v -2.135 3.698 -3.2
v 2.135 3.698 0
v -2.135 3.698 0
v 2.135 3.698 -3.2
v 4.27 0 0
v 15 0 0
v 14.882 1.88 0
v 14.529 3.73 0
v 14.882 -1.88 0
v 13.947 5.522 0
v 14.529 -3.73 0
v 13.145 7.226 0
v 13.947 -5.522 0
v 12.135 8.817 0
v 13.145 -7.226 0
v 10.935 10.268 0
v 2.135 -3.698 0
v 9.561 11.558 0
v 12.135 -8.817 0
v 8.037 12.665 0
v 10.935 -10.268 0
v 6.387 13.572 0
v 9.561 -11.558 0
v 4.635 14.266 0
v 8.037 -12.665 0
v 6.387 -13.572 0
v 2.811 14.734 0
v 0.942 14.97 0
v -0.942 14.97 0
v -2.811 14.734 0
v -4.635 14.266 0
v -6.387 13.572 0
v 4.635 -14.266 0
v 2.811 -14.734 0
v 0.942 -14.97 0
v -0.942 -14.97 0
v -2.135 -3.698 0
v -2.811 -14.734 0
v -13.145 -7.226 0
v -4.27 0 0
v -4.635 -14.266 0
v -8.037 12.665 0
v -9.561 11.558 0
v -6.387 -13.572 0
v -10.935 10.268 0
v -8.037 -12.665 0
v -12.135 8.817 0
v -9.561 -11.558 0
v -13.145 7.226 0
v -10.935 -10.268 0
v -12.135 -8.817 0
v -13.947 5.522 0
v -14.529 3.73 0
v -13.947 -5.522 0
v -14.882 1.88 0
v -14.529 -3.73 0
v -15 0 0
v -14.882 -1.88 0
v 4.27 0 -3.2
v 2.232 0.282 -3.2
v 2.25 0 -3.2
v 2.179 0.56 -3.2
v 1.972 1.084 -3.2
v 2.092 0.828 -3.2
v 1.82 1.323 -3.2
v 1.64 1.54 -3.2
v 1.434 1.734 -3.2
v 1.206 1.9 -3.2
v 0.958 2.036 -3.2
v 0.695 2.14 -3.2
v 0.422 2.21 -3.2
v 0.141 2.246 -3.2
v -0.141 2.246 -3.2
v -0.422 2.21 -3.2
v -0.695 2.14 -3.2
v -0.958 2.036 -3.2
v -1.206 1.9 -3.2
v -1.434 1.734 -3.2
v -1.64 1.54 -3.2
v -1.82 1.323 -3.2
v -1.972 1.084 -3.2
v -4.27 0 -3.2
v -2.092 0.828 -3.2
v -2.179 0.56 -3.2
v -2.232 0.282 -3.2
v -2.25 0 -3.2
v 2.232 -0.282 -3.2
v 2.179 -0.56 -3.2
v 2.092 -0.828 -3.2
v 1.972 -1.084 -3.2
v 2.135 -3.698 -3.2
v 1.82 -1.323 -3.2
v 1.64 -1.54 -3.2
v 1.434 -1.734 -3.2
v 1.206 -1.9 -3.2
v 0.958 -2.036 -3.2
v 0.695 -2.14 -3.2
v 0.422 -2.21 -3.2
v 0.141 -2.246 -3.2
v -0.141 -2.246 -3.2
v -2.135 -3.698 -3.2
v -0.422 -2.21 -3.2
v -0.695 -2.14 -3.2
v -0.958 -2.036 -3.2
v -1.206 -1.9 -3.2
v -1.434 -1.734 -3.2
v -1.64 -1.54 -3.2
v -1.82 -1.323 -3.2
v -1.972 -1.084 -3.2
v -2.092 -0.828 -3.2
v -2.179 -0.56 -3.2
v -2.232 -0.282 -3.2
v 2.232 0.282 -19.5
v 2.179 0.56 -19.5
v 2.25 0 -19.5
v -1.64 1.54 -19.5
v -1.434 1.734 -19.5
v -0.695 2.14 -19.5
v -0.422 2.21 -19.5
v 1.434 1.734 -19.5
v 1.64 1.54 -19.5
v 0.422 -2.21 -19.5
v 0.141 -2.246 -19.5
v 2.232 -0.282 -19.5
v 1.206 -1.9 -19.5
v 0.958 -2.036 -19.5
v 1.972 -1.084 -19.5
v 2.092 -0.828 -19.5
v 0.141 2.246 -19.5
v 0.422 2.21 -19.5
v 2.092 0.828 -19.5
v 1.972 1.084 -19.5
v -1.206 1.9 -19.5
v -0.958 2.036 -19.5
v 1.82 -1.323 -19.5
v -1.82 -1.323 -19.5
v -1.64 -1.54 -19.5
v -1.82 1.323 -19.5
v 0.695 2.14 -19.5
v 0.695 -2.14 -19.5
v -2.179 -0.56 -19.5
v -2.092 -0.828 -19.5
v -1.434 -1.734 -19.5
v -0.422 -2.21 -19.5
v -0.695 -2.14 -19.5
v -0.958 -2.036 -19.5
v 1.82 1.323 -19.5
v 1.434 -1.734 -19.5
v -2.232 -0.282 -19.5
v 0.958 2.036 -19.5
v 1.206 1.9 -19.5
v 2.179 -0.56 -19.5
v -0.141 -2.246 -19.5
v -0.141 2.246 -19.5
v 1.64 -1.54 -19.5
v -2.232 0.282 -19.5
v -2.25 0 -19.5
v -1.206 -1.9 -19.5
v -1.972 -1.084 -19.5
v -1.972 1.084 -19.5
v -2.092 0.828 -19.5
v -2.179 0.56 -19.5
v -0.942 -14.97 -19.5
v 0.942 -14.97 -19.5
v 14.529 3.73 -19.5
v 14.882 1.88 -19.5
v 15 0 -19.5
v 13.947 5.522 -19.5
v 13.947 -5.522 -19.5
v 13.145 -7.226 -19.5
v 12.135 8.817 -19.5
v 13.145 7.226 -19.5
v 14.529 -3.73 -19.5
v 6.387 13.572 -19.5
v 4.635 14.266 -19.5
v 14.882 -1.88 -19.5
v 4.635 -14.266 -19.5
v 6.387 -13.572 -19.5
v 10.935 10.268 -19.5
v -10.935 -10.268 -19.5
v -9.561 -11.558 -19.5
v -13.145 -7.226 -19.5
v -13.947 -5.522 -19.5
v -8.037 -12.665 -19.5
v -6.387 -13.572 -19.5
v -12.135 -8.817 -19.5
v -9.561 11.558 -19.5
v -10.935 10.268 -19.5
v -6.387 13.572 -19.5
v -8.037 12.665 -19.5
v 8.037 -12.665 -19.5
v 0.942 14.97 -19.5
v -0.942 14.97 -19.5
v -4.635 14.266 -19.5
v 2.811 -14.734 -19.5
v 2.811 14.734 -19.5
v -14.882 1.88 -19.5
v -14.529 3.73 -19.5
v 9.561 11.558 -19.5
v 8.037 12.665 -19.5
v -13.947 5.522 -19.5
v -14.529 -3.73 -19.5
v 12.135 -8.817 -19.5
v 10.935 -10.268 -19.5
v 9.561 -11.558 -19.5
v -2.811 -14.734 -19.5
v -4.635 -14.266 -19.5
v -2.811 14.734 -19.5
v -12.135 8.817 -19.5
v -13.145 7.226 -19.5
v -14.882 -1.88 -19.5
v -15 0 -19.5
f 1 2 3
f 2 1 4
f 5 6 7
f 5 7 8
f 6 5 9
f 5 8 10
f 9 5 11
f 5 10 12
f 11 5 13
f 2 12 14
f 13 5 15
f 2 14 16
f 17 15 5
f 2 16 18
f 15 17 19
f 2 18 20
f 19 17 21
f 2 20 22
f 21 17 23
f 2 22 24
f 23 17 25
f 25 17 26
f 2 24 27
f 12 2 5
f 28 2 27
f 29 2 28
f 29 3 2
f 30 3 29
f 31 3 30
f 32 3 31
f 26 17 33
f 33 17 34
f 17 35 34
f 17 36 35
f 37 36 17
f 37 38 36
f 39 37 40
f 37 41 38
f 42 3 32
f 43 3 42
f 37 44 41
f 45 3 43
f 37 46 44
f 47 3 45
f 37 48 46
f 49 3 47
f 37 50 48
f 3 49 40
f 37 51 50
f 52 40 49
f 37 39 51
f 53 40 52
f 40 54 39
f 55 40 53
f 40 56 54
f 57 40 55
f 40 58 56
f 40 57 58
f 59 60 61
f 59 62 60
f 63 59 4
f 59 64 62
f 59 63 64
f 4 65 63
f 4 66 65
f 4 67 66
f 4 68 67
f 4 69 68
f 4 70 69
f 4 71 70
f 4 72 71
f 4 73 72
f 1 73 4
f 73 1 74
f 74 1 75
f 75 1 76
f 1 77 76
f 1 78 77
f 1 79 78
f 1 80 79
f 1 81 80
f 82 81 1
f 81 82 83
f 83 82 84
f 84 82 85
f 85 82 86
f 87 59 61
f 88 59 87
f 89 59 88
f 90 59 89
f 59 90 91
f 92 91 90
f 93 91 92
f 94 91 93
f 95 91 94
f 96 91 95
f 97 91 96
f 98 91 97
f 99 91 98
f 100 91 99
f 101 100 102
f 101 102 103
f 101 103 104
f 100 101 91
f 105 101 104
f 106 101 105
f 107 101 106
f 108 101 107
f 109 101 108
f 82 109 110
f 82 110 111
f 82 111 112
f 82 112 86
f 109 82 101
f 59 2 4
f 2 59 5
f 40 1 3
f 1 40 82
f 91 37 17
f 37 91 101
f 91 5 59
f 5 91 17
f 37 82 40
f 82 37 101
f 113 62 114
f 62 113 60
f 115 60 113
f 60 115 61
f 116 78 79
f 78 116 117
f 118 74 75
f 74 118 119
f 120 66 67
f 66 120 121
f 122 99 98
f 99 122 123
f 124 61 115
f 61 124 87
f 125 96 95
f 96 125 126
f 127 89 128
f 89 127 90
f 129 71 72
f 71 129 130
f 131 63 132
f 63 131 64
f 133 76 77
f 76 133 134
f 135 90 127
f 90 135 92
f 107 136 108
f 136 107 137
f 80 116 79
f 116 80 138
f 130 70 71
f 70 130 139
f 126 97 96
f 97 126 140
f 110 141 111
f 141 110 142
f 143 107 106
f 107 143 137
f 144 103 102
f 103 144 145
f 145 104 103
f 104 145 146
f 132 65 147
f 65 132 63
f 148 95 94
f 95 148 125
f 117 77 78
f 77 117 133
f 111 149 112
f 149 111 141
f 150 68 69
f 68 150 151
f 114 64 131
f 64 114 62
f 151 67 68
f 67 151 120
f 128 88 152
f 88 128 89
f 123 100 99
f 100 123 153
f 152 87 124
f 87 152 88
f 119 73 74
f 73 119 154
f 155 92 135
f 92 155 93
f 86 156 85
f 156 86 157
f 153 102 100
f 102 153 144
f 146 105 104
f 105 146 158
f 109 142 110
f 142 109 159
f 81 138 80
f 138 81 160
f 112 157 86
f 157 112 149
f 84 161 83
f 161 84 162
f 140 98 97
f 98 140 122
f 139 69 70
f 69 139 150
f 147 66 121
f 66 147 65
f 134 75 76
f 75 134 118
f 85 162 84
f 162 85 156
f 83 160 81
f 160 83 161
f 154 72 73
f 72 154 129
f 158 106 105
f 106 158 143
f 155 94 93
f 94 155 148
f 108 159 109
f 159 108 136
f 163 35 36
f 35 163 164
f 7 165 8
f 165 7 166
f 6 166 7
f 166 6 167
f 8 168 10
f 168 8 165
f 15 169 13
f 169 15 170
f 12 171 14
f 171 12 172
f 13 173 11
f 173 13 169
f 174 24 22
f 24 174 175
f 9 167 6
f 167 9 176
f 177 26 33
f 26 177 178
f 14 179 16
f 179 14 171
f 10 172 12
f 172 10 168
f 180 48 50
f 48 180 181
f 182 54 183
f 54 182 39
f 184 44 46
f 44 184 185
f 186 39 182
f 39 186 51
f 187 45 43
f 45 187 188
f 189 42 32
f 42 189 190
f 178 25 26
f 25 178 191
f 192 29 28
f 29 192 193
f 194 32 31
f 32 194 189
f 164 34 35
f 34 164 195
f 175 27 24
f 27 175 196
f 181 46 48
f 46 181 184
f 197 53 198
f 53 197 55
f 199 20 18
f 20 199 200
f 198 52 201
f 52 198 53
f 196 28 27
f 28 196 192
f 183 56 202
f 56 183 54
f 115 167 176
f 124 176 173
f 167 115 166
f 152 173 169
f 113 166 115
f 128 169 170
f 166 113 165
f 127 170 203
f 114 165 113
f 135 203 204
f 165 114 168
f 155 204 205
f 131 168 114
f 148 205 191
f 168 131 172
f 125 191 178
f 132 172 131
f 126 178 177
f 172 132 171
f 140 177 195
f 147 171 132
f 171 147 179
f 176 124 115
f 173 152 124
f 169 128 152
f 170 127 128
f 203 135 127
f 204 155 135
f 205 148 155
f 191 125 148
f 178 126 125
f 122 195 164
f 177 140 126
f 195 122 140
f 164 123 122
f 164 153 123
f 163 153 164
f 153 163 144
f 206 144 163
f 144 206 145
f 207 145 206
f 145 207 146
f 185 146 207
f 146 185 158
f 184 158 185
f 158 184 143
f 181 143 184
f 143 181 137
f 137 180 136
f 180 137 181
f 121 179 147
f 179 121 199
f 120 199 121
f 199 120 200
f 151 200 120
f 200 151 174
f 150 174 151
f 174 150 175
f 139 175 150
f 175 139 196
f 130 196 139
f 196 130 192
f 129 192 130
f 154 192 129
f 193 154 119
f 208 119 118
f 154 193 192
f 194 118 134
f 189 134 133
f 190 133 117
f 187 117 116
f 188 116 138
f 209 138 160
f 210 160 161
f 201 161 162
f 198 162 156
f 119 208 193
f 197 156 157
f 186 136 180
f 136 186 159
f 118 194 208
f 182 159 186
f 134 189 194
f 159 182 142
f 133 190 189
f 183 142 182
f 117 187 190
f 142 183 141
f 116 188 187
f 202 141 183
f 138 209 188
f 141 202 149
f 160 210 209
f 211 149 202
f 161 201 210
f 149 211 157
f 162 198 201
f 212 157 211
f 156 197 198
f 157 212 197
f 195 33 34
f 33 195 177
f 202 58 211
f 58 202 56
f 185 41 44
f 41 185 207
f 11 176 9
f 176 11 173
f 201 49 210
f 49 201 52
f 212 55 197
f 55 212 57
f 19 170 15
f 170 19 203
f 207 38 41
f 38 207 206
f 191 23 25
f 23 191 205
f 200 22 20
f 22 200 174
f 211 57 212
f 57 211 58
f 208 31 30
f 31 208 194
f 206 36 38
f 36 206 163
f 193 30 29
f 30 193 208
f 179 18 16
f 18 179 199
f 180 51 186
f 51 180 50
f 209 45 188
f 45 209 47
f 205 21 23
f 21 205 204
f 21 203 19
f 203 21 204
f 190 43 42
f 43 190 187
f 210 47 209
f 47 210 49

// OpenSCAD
$fn = 50;

difference() {
	union() {
		translate(v = [0, 0, -19.5]) {
			cylinder(h = 19.5, r = 15.0);
		}
	}
	union() {
		translate(v = [0, 0, 0]) {
			rotate(a = [0, 0, 0]) {
				difference() {
					union() {
						translate(v = [0, 0, -3.2]) {
							linear_extrude(height = 3.2) {
								polygon(points = [[4.2698, 0.0], [2.1349000000000005, 3.697755269078796], [-2.134899999999999, 3.6977552690787965], [-4.2698, 5.228996902999369e-16], [-2.134900000000002, -3.6977552690787956], [2.1348999999999974, -3.697755269078798]]);
							}
						}
					}
					union();
				}
			}
		}
		#translate(v = [0, 0, -100.0]) {
			cylinder(h = 200, r = 2.25);
		}
	}
}
